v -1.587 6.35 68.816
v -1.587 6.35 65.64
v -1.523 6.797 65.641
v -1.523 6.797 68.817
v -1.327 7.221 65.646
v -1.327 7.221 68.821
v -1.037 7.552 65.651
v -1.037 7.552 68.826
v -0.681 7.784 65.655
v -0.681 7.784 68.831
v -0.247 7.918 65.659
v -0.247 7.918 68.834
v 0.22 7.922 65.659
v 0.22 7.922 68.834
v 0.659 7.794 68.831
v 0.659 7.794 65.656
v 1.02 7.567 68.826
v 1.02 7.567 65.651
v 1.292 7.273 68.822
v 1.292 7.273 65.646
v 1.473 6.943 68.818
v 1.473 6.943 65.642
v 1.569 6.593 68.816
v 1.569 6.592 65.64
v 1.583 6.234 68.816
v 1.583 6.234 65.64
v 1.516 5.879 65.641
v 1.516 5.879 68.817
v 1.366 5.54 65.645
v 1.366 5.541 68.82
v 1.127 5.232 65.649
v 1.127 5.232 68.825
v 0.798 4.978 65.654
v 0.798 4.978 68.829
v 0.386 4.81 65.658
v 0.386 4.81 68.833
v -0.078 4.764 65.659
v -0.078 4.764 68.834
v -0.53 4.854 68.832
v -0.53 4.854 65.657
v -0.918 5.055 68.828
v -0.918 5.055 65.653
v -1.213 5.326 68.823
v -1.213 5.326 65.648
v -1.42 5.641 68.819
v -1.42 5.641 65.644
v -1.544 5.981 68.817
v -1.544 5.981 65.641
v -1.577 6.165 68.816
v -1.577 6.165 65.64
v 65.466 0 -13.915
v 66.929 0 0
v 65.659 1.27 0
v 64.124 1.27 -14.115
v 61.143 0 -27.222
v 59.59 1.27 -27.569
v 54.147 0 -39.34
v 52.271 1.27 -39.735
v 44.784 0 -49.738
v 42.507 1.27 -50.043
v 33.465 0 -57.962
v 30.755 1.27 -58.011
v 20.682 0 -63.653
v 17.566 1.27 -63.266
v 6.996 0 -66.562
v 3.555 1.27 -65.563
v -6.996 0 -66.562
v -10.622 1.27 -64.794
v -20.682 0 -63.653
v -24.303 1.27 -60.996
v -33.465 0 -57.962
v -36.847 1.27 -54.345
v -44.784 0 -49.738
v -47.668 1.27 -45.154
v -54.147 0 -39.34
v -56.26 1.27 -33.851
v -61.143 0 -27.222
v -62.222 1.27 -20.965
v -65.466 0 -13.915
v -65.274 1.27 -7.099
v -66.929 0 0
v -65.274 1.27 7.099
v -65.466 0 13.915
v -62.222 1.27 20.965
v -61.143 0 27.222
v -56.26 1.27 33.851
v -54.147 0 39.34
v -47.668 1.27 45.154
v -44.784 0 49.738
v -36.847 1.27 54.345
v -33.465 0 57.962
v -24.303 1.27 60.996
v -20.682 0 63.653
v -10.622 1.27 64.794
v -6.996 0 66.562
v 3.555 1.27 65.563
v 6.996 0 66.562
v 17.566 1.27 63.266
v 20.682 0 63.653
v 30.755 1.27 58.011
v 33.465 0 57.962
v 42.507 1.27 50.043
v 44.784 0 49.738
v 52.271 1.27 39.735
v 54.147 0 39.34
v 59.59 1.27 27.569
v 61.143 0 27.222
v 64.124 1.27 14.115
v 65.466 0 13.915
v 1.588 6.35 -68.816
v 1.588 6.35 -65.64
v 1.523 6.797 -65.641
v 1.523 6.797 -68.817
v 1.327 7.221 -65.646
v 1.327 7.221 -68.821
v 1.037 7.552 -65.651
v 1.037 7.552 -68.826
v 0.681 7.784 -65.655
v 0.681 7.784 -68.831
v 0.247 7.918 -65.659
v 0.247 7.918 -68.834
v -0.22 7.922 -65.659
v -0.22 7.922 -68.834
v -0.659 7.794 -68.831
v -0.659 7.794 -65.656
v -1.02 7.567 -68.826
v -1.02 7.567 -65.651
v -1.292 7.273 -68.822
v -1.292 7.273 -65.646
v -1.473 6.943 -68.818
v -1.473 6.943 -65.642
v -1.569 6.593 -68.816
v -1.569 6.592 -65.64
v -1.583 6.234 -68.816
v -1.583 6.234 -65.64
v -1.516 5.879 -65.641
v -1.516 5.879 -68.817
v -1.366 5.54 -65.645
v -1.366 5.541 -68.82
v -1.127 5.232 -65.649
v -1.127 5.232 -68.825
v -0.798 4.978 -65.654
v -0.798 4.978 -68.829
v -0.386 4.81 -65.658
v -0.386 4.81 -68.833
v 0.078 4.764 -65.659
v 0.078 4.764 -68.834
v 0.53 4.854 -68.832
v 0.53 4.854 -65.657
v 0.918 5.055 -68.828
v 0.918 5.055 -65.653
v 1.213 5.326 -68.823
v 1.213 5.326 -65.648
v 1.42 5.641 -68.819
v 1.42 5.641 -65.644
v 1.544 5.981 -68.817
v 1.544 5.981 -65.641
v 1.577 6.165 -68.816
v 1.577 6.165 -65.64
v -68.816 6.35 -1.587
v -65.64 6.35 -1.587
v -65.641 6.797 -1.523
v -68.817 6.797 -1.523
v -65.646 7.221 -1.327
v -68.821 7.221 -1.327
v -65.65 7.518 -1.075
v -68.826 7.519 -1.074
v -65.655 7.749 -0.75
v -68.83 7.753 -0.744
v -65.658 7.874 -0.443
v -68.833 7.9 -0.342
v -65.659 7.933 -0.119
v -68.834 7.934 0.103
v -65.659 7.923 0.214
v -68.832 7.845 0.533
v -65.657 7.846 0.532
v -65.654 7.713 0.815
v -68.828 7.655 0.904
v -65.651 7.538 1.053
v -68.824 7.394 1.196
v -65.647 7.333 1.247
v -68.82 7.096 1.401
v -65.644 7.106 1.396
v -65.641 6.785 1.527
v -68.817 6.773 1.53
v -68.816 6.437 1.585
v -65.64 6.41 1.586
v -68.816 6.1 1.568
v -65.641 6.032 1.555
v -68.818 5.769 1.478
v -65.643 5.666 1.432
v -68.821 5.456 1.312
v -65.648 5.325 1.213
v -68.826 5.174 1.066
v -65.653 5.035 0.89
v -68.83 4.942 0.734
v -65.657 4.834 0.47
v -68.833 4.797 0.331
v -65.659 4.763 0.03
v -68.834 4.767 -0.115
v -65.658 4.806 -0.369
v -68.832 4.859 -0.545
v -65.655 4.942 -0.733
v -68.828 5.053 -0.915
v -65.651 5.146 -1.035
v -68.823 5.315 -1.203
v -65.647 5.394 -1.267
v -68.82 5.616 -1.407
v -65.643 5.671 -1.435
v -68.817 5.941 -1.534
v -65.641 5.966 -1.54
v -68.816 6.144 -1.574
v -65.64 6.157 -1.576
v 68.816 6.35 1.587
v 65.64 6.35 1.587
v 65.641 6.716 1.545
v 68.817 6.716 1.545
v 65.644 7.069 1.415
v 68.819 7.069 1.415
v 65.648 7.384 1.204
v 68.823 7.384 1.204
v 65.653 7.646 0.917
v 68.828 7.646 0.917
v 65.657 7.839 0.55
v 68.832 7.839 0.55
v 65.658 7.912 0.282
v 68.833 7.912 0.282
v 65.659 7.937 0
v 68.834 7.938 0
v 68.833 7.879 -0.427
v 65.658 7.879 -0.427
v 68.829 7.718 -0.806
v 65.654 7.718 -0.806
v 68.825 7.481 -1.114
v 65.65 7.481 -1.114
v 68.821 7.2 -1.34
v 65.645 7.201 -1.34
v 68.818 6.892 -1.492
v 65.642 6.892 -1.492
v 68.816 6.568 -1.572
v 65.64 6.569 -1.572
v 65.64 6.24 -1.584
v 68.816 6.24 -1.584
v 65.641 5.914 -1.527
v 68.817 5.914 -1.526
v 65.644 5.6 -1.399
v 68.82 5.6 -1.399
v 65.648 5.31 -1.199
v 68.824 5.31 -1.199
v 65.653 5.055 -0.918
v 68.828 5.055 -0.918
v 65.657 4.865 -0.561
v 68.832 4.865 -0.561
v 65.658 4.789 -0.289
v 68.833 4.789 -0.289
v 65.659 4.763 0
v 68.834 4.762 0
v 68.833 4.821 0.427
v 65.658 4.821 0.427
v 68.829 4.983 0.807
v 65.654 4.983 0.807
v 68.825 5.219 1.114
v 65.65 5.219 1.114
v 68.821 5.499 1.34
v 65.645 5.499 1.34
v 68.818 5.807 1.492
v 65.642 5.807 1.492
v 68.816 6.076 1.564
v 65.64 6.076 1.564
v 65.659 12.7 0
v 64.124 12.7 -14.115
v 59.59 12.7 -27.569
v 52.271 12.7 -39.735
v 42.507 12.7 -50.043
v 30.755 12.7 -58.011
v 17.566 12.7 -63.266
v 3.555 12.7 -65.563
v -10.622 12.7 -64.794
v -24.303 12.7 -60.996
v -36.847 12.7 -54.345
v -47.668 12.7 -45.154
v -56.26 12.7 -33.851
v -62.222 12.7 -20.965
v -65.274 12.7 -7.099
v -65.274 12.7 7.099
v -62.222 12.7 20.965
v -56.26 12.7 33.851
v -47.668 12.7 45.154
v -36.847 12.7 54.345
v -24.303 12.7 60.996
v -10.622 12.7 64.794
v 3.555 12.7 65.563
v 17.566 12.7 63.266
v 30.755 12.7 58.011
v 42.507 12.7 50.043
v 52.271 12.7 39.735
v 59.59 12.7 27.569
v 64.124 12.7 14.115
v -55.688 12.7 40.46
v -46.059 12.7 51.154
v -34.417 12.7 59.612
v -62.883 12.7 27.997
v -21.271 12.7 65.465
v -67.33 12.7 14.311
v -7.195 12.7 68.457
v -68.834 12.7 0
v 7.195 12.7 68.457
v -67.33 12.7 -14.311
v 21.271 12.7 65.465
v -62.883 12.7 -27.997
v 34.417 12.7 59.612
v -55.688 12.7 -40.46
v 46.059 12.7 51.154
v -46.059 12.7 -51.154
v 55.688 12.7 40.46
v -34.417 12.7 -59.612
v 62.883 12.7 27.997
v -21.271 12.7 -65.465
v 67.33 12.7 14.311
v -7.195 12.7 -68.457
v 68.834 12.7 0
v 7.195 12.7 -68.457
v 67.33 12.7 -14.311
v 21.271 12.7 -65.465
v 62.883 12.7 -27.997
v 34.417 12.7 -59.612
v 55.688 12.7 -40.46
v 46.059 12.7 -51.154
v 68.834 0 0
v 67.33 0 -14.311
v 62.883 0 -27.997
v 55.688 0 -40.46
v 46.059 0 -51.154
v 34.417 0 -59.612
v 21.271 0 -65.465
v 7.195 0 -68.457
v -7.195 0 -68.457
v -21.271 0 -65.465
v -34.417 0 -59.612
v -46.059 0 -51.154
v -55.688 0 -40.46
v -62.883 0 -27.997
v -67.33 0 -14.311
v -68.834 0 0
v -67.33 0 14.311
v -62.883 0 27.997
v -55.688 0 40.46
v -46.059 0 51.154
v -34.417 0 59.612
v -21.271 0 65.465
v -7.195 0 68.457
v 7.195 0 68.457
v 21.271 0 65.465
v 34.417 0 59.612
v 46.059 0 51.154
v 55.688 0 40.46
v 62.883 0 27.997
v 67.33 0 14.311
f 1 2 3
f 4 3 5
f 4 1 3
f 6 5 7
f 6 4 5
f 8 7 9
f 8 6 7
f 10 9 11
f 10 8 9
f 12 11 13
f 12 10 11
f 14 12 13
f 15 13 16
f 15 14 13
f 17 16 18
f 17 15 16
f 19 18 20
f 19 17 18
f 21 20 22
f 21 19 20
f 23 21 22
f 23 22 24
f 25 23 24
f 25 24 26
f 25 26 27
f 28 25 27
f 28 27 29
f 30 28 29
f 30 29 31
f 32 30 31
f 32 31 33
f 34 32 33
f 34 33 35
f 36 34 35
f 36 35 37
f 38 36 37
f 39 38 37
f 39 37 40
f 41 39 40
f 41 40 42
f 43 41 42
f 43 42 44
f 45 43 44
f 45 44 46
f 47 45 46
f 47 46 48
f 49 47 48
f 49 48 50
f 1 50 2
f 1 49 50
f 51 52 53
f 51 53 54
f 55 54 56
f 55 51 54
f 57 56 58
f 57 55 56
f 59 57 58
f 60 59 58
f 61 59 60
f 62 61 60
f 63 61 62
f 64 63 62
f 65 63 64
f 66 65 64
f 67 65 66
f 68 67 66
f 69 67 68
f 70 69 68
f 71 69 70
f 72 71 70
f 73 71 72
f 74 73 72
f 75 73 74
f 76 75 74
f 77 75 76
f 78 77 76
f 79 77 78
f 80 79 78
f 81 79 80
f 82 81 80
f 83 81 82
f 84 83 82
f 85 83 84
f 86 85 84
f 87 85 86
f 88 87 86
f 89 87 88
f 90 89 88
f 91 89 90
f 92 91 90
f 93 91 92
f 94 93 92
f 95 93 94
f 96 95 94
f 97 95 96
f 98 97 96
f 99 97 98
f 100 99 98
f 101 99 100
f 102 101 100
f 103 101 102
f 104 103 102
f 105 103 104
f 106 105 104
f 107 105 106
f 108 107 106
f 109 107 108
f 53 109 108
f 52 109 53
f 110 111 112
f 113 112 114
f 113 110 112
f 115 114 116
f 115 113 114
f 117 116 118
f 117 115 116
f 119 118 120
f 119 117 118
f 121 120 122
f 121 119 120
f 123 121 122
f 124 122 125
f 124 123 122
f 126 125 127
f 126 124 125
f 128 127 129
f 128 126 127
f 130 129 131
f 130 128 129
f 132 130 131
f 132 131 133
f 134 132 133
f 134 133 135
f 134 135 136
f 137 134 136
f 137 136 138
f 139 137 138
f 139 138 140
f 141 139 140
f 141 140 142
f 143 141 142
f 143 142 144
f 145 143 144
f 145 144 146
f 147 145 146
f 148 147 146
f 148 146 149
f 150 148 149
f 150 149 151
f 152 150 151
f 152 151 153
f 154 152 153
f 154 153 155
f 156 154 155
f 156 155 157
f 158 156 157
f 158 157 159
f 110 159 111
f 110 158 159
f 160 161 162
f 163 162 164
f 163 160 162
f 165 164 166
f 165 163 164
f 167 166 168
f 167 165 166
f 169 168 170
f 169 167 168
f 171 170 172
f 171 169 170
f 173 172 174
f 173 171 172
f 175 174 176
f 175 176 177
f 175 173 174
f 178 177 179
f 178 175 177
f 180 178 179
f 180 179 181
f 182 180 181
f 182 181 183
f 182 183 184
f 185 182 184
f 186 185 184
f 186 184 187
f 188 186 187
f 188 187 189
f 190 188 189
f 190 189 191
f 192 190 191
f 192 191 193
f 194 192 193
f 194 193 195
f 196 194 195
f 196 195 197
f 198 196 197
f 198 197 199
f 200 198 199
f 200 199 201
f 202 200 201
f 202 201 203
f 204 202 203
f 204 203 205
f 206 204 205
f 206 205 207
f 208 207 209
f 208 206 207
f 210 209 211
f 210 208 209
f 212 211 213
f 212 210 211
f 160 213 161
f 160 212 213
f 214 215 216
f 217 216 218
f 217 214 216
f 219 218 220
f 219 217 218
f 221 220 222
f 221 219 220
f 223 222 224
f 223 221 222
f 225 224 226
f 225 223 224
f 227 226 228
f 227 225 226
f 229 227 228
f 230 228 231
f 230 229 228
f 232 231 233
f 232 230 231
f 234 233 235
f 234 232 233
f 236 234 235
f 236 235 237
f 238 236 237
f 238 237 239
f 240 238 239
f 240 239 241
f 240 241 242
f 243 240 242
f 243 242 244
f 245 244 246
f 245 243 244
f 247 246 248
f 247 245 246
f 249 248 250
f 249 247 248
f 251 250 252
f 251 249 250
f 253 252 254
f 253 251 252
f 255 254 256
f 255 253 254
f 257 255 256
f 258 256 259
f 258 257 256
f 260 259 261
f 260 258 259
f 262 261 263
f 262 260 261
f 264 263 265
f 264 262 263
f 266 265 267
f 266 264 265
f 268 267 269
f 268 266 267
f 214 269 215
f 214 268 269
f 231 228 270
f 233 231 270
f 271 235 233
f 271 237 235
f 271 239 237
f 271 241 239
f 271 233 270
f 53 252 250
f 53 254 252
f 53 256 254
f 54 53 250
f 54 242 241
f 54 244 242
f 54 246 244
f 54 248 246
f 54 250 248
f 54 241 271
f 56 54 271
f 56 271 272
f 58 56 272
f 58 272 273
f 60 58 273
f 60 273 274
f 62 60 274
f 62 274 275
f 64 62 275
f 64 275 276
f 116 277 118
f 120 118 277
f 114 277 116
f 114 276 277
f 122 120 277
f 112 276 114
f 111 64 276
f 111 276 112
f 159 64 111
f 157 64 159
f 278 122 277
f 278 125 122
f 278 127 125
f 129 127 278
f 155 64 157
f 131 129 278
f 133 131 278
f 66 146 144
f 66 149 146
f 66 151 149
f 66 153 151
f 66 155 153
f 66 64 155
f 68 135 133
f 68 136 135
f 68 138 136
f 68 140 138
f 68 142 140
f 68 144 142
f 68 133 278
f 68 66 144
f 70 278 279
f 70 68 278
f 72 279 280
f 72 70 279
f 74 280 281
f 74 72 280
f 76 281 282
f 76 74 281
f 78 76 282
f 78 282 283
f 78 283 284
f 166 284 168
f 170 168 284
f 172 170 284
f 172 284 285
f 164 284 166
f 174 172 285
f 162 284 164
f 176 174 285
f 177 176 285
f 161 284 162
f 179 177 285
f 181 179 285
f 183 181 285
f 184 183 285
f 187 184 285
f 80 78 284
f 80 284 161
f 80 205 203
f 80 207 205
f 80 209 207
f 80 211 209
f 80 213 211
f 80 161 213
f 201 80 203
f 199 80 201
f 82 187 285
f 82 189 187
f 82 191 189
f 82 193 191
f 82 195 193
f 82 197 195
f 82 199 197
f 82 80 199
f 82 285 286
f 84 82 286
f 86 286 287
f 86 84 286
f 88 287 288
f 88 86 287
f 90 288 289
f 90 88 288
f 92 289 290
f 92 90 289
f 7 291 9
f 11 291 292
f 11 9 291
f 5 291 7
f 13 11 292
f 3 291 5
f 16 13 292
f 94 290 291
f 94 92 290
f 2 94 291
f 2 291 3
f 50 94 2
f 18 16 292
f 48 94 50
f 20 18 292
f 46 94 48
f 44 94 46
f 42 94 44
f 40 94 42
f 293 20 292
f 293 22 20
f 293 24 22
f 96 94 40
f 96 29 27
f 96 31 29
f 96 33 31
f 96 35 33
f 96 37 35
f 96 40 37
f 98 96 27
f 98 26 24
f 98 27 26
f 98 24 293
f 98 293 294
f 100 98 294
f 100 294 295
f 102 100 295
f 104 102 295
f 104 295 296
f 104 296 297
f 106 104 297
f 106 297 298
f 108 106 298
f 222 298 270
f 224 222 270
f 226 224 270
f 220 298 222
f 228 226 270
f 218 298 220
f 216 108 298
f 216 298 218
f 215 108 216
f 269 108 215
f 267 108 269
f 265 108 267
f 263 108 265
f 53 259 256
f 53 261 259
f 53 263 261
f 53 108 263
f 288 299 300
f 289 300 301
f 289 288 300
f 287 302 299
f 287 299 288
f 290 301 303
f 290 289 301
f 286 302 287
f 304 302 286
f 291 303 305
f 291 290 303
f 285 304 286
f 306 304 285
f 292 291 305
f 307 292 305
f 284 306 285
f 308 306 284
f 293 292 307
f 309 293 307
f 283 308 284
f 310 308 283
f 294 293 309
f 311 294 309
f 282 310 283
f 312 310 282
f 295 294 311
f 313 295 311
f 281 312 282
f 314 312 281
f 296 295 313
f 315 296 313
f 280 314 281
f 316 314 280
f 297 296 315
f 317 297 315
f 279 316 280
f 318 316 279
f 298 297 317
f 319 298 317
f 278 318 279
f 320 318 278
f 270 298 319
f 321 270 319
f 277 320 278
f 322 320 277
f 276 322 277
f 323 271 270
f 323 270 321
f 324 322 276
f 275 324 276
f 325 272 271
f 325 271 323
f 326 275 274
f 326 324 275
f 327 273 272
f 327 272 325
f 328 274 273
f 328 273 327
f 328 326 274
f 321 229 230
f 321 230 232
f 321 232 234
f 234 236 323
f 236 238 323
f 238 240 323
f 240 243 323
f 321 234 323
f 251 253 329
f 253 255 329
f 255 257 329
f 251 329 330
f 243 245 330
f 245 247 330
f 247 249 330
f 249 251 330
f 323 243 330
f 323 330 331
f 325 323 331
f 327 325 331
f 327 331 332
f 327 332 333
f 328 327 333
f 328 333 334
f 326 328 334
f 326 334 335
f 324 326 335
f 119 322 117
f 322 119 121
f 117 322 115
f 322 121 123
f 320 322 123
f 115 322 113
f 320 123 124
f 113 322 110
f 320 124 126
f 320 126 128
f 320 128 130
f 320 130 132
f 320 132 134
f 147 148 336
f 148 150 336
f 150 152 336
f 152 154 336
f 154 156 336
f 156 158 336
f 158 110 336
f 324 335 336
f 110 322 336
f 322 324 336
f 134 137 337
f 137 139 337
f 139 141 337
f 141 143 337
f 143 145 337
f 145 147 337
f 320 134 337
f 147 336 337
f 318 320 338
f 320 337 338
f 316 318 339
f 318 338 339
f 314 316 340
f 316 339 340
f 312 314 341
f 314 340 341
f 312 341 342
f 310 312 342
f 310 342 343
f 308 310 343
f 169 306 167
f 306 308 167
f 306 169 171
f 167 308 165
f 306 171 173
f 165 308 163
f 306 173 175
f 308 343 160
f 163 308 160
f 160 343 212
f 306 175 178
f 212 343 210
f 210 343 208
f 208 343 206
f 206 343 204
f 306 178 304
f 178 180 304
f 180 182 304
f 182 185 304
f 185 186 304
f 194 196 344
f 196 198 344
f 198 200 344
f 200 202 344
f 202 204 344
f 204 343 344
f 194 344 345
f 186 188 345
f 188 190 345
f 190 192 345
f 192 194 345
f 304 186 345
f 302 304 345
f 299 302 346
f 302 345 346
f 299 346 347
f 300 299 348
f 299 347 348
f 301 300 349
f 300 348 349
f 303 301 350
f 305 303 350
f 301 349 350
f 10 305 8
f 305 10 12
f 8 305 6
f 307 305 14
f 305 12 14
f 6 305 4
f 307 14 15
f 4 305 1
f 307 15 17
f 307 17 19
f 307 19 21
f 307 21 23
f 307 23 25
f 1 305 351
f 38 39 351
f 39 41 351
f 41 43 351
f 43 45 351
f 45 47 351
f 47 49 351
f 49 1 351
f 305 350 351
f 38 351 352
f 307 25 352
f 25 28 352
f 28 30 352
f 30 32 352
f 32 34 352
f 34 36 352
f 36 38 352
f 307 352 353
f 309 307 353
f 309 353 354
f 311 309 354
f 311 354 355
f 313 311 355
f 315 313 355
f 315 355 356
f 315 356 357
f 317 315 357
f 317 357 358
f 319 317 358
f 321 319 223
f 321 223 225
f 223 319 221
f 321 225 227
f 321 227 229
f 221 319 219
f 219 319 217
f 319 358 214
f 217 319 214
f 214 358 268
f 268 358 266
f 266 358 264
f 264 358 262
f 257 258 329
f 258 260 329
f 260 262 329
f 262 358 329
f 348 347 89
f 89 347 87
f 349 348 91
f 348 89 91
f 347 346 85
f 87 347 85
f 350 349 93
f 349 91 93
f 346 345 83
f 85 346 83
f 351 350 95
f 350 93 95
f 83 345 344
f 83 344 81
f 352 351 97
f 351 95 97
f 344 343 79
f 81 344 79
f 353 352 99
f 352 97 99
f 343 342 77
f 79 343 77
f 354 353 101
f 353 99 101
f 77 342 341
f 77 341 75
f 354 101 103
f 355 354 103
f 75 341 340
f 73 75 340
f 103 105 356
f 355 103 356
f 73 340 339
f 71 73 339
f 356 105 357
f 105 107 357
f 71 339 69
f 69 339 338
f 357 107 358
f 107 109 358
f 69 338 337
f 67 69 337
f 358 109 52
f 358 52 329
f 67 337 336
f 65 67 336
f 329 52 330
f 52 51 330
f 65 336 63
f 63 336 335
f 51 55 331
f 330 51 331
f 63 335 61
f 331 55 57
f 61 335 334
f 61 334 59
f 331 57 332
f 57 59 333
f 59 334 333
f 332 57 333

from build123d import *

# Parameters (mm, degrees)
SKETCH1_R           = 68.834
SKETCH1_R_2         = 65.659
BOSS_EXTRUDE1_DEPTH = 12.7
CUT_EXTRUDE1_START  = -68.834
SKETCH2_R           = 1.5875
CUT_EXTRUDE1_DEPTH  = 3.194194
CIRPATTERN1_COUNT   = 4
CHAMFER1_SIZE       = 1.27


with BuildPart() as part:
    # Sketch1 → Boss-Extrude1 (new body)
    with BuildSketch(Plane(origin=(0, 0, 0), x_dir=(1, 0, 0), z_dir=(0, 1, 0))):
        Circle(SKETCH1_R)
        Circle(SKETCH1_R_2, mode=Mode.SUBTRACT)
    extrude(amount=BOSS_EXTRUDE1_DEPTH)

    # Sketch2 → Cut-Extrude1 (cut)
    with BuildSketch(Plane.XY.offset(CUT_EXTRUDE1_START)):
        with Locations((0, 6.35)):
            Circle(SKETCH2_R)
    cut_extrude1 = extrude(amount=CUT_EXTRUDE1_DEPTH, mode=Mode.SUBTRACT)

    # CirPattern1: Cut-Extrude1 ×4 about axis
    cirpattern1_axis = Axis((0, 12.7, 0), (0, -1, 0))
    for i in range(1, CIRPATTERN1_COUNT):
        add(cut_extrude1.rotate(cirpattern1_axis, i * 360 / CIRPATTERN1_COUNT), mode=Mode.SUBTRACT)

    # Chamfer1
    chamfer1_edges = [part.edges().sort_by_distance(p)[0] for p in [
        (-65.659, 0, 0),
    ]]
    chamfer(chamfer1_edges, length=CHAMFER1_SIZE)


solid = part.part
